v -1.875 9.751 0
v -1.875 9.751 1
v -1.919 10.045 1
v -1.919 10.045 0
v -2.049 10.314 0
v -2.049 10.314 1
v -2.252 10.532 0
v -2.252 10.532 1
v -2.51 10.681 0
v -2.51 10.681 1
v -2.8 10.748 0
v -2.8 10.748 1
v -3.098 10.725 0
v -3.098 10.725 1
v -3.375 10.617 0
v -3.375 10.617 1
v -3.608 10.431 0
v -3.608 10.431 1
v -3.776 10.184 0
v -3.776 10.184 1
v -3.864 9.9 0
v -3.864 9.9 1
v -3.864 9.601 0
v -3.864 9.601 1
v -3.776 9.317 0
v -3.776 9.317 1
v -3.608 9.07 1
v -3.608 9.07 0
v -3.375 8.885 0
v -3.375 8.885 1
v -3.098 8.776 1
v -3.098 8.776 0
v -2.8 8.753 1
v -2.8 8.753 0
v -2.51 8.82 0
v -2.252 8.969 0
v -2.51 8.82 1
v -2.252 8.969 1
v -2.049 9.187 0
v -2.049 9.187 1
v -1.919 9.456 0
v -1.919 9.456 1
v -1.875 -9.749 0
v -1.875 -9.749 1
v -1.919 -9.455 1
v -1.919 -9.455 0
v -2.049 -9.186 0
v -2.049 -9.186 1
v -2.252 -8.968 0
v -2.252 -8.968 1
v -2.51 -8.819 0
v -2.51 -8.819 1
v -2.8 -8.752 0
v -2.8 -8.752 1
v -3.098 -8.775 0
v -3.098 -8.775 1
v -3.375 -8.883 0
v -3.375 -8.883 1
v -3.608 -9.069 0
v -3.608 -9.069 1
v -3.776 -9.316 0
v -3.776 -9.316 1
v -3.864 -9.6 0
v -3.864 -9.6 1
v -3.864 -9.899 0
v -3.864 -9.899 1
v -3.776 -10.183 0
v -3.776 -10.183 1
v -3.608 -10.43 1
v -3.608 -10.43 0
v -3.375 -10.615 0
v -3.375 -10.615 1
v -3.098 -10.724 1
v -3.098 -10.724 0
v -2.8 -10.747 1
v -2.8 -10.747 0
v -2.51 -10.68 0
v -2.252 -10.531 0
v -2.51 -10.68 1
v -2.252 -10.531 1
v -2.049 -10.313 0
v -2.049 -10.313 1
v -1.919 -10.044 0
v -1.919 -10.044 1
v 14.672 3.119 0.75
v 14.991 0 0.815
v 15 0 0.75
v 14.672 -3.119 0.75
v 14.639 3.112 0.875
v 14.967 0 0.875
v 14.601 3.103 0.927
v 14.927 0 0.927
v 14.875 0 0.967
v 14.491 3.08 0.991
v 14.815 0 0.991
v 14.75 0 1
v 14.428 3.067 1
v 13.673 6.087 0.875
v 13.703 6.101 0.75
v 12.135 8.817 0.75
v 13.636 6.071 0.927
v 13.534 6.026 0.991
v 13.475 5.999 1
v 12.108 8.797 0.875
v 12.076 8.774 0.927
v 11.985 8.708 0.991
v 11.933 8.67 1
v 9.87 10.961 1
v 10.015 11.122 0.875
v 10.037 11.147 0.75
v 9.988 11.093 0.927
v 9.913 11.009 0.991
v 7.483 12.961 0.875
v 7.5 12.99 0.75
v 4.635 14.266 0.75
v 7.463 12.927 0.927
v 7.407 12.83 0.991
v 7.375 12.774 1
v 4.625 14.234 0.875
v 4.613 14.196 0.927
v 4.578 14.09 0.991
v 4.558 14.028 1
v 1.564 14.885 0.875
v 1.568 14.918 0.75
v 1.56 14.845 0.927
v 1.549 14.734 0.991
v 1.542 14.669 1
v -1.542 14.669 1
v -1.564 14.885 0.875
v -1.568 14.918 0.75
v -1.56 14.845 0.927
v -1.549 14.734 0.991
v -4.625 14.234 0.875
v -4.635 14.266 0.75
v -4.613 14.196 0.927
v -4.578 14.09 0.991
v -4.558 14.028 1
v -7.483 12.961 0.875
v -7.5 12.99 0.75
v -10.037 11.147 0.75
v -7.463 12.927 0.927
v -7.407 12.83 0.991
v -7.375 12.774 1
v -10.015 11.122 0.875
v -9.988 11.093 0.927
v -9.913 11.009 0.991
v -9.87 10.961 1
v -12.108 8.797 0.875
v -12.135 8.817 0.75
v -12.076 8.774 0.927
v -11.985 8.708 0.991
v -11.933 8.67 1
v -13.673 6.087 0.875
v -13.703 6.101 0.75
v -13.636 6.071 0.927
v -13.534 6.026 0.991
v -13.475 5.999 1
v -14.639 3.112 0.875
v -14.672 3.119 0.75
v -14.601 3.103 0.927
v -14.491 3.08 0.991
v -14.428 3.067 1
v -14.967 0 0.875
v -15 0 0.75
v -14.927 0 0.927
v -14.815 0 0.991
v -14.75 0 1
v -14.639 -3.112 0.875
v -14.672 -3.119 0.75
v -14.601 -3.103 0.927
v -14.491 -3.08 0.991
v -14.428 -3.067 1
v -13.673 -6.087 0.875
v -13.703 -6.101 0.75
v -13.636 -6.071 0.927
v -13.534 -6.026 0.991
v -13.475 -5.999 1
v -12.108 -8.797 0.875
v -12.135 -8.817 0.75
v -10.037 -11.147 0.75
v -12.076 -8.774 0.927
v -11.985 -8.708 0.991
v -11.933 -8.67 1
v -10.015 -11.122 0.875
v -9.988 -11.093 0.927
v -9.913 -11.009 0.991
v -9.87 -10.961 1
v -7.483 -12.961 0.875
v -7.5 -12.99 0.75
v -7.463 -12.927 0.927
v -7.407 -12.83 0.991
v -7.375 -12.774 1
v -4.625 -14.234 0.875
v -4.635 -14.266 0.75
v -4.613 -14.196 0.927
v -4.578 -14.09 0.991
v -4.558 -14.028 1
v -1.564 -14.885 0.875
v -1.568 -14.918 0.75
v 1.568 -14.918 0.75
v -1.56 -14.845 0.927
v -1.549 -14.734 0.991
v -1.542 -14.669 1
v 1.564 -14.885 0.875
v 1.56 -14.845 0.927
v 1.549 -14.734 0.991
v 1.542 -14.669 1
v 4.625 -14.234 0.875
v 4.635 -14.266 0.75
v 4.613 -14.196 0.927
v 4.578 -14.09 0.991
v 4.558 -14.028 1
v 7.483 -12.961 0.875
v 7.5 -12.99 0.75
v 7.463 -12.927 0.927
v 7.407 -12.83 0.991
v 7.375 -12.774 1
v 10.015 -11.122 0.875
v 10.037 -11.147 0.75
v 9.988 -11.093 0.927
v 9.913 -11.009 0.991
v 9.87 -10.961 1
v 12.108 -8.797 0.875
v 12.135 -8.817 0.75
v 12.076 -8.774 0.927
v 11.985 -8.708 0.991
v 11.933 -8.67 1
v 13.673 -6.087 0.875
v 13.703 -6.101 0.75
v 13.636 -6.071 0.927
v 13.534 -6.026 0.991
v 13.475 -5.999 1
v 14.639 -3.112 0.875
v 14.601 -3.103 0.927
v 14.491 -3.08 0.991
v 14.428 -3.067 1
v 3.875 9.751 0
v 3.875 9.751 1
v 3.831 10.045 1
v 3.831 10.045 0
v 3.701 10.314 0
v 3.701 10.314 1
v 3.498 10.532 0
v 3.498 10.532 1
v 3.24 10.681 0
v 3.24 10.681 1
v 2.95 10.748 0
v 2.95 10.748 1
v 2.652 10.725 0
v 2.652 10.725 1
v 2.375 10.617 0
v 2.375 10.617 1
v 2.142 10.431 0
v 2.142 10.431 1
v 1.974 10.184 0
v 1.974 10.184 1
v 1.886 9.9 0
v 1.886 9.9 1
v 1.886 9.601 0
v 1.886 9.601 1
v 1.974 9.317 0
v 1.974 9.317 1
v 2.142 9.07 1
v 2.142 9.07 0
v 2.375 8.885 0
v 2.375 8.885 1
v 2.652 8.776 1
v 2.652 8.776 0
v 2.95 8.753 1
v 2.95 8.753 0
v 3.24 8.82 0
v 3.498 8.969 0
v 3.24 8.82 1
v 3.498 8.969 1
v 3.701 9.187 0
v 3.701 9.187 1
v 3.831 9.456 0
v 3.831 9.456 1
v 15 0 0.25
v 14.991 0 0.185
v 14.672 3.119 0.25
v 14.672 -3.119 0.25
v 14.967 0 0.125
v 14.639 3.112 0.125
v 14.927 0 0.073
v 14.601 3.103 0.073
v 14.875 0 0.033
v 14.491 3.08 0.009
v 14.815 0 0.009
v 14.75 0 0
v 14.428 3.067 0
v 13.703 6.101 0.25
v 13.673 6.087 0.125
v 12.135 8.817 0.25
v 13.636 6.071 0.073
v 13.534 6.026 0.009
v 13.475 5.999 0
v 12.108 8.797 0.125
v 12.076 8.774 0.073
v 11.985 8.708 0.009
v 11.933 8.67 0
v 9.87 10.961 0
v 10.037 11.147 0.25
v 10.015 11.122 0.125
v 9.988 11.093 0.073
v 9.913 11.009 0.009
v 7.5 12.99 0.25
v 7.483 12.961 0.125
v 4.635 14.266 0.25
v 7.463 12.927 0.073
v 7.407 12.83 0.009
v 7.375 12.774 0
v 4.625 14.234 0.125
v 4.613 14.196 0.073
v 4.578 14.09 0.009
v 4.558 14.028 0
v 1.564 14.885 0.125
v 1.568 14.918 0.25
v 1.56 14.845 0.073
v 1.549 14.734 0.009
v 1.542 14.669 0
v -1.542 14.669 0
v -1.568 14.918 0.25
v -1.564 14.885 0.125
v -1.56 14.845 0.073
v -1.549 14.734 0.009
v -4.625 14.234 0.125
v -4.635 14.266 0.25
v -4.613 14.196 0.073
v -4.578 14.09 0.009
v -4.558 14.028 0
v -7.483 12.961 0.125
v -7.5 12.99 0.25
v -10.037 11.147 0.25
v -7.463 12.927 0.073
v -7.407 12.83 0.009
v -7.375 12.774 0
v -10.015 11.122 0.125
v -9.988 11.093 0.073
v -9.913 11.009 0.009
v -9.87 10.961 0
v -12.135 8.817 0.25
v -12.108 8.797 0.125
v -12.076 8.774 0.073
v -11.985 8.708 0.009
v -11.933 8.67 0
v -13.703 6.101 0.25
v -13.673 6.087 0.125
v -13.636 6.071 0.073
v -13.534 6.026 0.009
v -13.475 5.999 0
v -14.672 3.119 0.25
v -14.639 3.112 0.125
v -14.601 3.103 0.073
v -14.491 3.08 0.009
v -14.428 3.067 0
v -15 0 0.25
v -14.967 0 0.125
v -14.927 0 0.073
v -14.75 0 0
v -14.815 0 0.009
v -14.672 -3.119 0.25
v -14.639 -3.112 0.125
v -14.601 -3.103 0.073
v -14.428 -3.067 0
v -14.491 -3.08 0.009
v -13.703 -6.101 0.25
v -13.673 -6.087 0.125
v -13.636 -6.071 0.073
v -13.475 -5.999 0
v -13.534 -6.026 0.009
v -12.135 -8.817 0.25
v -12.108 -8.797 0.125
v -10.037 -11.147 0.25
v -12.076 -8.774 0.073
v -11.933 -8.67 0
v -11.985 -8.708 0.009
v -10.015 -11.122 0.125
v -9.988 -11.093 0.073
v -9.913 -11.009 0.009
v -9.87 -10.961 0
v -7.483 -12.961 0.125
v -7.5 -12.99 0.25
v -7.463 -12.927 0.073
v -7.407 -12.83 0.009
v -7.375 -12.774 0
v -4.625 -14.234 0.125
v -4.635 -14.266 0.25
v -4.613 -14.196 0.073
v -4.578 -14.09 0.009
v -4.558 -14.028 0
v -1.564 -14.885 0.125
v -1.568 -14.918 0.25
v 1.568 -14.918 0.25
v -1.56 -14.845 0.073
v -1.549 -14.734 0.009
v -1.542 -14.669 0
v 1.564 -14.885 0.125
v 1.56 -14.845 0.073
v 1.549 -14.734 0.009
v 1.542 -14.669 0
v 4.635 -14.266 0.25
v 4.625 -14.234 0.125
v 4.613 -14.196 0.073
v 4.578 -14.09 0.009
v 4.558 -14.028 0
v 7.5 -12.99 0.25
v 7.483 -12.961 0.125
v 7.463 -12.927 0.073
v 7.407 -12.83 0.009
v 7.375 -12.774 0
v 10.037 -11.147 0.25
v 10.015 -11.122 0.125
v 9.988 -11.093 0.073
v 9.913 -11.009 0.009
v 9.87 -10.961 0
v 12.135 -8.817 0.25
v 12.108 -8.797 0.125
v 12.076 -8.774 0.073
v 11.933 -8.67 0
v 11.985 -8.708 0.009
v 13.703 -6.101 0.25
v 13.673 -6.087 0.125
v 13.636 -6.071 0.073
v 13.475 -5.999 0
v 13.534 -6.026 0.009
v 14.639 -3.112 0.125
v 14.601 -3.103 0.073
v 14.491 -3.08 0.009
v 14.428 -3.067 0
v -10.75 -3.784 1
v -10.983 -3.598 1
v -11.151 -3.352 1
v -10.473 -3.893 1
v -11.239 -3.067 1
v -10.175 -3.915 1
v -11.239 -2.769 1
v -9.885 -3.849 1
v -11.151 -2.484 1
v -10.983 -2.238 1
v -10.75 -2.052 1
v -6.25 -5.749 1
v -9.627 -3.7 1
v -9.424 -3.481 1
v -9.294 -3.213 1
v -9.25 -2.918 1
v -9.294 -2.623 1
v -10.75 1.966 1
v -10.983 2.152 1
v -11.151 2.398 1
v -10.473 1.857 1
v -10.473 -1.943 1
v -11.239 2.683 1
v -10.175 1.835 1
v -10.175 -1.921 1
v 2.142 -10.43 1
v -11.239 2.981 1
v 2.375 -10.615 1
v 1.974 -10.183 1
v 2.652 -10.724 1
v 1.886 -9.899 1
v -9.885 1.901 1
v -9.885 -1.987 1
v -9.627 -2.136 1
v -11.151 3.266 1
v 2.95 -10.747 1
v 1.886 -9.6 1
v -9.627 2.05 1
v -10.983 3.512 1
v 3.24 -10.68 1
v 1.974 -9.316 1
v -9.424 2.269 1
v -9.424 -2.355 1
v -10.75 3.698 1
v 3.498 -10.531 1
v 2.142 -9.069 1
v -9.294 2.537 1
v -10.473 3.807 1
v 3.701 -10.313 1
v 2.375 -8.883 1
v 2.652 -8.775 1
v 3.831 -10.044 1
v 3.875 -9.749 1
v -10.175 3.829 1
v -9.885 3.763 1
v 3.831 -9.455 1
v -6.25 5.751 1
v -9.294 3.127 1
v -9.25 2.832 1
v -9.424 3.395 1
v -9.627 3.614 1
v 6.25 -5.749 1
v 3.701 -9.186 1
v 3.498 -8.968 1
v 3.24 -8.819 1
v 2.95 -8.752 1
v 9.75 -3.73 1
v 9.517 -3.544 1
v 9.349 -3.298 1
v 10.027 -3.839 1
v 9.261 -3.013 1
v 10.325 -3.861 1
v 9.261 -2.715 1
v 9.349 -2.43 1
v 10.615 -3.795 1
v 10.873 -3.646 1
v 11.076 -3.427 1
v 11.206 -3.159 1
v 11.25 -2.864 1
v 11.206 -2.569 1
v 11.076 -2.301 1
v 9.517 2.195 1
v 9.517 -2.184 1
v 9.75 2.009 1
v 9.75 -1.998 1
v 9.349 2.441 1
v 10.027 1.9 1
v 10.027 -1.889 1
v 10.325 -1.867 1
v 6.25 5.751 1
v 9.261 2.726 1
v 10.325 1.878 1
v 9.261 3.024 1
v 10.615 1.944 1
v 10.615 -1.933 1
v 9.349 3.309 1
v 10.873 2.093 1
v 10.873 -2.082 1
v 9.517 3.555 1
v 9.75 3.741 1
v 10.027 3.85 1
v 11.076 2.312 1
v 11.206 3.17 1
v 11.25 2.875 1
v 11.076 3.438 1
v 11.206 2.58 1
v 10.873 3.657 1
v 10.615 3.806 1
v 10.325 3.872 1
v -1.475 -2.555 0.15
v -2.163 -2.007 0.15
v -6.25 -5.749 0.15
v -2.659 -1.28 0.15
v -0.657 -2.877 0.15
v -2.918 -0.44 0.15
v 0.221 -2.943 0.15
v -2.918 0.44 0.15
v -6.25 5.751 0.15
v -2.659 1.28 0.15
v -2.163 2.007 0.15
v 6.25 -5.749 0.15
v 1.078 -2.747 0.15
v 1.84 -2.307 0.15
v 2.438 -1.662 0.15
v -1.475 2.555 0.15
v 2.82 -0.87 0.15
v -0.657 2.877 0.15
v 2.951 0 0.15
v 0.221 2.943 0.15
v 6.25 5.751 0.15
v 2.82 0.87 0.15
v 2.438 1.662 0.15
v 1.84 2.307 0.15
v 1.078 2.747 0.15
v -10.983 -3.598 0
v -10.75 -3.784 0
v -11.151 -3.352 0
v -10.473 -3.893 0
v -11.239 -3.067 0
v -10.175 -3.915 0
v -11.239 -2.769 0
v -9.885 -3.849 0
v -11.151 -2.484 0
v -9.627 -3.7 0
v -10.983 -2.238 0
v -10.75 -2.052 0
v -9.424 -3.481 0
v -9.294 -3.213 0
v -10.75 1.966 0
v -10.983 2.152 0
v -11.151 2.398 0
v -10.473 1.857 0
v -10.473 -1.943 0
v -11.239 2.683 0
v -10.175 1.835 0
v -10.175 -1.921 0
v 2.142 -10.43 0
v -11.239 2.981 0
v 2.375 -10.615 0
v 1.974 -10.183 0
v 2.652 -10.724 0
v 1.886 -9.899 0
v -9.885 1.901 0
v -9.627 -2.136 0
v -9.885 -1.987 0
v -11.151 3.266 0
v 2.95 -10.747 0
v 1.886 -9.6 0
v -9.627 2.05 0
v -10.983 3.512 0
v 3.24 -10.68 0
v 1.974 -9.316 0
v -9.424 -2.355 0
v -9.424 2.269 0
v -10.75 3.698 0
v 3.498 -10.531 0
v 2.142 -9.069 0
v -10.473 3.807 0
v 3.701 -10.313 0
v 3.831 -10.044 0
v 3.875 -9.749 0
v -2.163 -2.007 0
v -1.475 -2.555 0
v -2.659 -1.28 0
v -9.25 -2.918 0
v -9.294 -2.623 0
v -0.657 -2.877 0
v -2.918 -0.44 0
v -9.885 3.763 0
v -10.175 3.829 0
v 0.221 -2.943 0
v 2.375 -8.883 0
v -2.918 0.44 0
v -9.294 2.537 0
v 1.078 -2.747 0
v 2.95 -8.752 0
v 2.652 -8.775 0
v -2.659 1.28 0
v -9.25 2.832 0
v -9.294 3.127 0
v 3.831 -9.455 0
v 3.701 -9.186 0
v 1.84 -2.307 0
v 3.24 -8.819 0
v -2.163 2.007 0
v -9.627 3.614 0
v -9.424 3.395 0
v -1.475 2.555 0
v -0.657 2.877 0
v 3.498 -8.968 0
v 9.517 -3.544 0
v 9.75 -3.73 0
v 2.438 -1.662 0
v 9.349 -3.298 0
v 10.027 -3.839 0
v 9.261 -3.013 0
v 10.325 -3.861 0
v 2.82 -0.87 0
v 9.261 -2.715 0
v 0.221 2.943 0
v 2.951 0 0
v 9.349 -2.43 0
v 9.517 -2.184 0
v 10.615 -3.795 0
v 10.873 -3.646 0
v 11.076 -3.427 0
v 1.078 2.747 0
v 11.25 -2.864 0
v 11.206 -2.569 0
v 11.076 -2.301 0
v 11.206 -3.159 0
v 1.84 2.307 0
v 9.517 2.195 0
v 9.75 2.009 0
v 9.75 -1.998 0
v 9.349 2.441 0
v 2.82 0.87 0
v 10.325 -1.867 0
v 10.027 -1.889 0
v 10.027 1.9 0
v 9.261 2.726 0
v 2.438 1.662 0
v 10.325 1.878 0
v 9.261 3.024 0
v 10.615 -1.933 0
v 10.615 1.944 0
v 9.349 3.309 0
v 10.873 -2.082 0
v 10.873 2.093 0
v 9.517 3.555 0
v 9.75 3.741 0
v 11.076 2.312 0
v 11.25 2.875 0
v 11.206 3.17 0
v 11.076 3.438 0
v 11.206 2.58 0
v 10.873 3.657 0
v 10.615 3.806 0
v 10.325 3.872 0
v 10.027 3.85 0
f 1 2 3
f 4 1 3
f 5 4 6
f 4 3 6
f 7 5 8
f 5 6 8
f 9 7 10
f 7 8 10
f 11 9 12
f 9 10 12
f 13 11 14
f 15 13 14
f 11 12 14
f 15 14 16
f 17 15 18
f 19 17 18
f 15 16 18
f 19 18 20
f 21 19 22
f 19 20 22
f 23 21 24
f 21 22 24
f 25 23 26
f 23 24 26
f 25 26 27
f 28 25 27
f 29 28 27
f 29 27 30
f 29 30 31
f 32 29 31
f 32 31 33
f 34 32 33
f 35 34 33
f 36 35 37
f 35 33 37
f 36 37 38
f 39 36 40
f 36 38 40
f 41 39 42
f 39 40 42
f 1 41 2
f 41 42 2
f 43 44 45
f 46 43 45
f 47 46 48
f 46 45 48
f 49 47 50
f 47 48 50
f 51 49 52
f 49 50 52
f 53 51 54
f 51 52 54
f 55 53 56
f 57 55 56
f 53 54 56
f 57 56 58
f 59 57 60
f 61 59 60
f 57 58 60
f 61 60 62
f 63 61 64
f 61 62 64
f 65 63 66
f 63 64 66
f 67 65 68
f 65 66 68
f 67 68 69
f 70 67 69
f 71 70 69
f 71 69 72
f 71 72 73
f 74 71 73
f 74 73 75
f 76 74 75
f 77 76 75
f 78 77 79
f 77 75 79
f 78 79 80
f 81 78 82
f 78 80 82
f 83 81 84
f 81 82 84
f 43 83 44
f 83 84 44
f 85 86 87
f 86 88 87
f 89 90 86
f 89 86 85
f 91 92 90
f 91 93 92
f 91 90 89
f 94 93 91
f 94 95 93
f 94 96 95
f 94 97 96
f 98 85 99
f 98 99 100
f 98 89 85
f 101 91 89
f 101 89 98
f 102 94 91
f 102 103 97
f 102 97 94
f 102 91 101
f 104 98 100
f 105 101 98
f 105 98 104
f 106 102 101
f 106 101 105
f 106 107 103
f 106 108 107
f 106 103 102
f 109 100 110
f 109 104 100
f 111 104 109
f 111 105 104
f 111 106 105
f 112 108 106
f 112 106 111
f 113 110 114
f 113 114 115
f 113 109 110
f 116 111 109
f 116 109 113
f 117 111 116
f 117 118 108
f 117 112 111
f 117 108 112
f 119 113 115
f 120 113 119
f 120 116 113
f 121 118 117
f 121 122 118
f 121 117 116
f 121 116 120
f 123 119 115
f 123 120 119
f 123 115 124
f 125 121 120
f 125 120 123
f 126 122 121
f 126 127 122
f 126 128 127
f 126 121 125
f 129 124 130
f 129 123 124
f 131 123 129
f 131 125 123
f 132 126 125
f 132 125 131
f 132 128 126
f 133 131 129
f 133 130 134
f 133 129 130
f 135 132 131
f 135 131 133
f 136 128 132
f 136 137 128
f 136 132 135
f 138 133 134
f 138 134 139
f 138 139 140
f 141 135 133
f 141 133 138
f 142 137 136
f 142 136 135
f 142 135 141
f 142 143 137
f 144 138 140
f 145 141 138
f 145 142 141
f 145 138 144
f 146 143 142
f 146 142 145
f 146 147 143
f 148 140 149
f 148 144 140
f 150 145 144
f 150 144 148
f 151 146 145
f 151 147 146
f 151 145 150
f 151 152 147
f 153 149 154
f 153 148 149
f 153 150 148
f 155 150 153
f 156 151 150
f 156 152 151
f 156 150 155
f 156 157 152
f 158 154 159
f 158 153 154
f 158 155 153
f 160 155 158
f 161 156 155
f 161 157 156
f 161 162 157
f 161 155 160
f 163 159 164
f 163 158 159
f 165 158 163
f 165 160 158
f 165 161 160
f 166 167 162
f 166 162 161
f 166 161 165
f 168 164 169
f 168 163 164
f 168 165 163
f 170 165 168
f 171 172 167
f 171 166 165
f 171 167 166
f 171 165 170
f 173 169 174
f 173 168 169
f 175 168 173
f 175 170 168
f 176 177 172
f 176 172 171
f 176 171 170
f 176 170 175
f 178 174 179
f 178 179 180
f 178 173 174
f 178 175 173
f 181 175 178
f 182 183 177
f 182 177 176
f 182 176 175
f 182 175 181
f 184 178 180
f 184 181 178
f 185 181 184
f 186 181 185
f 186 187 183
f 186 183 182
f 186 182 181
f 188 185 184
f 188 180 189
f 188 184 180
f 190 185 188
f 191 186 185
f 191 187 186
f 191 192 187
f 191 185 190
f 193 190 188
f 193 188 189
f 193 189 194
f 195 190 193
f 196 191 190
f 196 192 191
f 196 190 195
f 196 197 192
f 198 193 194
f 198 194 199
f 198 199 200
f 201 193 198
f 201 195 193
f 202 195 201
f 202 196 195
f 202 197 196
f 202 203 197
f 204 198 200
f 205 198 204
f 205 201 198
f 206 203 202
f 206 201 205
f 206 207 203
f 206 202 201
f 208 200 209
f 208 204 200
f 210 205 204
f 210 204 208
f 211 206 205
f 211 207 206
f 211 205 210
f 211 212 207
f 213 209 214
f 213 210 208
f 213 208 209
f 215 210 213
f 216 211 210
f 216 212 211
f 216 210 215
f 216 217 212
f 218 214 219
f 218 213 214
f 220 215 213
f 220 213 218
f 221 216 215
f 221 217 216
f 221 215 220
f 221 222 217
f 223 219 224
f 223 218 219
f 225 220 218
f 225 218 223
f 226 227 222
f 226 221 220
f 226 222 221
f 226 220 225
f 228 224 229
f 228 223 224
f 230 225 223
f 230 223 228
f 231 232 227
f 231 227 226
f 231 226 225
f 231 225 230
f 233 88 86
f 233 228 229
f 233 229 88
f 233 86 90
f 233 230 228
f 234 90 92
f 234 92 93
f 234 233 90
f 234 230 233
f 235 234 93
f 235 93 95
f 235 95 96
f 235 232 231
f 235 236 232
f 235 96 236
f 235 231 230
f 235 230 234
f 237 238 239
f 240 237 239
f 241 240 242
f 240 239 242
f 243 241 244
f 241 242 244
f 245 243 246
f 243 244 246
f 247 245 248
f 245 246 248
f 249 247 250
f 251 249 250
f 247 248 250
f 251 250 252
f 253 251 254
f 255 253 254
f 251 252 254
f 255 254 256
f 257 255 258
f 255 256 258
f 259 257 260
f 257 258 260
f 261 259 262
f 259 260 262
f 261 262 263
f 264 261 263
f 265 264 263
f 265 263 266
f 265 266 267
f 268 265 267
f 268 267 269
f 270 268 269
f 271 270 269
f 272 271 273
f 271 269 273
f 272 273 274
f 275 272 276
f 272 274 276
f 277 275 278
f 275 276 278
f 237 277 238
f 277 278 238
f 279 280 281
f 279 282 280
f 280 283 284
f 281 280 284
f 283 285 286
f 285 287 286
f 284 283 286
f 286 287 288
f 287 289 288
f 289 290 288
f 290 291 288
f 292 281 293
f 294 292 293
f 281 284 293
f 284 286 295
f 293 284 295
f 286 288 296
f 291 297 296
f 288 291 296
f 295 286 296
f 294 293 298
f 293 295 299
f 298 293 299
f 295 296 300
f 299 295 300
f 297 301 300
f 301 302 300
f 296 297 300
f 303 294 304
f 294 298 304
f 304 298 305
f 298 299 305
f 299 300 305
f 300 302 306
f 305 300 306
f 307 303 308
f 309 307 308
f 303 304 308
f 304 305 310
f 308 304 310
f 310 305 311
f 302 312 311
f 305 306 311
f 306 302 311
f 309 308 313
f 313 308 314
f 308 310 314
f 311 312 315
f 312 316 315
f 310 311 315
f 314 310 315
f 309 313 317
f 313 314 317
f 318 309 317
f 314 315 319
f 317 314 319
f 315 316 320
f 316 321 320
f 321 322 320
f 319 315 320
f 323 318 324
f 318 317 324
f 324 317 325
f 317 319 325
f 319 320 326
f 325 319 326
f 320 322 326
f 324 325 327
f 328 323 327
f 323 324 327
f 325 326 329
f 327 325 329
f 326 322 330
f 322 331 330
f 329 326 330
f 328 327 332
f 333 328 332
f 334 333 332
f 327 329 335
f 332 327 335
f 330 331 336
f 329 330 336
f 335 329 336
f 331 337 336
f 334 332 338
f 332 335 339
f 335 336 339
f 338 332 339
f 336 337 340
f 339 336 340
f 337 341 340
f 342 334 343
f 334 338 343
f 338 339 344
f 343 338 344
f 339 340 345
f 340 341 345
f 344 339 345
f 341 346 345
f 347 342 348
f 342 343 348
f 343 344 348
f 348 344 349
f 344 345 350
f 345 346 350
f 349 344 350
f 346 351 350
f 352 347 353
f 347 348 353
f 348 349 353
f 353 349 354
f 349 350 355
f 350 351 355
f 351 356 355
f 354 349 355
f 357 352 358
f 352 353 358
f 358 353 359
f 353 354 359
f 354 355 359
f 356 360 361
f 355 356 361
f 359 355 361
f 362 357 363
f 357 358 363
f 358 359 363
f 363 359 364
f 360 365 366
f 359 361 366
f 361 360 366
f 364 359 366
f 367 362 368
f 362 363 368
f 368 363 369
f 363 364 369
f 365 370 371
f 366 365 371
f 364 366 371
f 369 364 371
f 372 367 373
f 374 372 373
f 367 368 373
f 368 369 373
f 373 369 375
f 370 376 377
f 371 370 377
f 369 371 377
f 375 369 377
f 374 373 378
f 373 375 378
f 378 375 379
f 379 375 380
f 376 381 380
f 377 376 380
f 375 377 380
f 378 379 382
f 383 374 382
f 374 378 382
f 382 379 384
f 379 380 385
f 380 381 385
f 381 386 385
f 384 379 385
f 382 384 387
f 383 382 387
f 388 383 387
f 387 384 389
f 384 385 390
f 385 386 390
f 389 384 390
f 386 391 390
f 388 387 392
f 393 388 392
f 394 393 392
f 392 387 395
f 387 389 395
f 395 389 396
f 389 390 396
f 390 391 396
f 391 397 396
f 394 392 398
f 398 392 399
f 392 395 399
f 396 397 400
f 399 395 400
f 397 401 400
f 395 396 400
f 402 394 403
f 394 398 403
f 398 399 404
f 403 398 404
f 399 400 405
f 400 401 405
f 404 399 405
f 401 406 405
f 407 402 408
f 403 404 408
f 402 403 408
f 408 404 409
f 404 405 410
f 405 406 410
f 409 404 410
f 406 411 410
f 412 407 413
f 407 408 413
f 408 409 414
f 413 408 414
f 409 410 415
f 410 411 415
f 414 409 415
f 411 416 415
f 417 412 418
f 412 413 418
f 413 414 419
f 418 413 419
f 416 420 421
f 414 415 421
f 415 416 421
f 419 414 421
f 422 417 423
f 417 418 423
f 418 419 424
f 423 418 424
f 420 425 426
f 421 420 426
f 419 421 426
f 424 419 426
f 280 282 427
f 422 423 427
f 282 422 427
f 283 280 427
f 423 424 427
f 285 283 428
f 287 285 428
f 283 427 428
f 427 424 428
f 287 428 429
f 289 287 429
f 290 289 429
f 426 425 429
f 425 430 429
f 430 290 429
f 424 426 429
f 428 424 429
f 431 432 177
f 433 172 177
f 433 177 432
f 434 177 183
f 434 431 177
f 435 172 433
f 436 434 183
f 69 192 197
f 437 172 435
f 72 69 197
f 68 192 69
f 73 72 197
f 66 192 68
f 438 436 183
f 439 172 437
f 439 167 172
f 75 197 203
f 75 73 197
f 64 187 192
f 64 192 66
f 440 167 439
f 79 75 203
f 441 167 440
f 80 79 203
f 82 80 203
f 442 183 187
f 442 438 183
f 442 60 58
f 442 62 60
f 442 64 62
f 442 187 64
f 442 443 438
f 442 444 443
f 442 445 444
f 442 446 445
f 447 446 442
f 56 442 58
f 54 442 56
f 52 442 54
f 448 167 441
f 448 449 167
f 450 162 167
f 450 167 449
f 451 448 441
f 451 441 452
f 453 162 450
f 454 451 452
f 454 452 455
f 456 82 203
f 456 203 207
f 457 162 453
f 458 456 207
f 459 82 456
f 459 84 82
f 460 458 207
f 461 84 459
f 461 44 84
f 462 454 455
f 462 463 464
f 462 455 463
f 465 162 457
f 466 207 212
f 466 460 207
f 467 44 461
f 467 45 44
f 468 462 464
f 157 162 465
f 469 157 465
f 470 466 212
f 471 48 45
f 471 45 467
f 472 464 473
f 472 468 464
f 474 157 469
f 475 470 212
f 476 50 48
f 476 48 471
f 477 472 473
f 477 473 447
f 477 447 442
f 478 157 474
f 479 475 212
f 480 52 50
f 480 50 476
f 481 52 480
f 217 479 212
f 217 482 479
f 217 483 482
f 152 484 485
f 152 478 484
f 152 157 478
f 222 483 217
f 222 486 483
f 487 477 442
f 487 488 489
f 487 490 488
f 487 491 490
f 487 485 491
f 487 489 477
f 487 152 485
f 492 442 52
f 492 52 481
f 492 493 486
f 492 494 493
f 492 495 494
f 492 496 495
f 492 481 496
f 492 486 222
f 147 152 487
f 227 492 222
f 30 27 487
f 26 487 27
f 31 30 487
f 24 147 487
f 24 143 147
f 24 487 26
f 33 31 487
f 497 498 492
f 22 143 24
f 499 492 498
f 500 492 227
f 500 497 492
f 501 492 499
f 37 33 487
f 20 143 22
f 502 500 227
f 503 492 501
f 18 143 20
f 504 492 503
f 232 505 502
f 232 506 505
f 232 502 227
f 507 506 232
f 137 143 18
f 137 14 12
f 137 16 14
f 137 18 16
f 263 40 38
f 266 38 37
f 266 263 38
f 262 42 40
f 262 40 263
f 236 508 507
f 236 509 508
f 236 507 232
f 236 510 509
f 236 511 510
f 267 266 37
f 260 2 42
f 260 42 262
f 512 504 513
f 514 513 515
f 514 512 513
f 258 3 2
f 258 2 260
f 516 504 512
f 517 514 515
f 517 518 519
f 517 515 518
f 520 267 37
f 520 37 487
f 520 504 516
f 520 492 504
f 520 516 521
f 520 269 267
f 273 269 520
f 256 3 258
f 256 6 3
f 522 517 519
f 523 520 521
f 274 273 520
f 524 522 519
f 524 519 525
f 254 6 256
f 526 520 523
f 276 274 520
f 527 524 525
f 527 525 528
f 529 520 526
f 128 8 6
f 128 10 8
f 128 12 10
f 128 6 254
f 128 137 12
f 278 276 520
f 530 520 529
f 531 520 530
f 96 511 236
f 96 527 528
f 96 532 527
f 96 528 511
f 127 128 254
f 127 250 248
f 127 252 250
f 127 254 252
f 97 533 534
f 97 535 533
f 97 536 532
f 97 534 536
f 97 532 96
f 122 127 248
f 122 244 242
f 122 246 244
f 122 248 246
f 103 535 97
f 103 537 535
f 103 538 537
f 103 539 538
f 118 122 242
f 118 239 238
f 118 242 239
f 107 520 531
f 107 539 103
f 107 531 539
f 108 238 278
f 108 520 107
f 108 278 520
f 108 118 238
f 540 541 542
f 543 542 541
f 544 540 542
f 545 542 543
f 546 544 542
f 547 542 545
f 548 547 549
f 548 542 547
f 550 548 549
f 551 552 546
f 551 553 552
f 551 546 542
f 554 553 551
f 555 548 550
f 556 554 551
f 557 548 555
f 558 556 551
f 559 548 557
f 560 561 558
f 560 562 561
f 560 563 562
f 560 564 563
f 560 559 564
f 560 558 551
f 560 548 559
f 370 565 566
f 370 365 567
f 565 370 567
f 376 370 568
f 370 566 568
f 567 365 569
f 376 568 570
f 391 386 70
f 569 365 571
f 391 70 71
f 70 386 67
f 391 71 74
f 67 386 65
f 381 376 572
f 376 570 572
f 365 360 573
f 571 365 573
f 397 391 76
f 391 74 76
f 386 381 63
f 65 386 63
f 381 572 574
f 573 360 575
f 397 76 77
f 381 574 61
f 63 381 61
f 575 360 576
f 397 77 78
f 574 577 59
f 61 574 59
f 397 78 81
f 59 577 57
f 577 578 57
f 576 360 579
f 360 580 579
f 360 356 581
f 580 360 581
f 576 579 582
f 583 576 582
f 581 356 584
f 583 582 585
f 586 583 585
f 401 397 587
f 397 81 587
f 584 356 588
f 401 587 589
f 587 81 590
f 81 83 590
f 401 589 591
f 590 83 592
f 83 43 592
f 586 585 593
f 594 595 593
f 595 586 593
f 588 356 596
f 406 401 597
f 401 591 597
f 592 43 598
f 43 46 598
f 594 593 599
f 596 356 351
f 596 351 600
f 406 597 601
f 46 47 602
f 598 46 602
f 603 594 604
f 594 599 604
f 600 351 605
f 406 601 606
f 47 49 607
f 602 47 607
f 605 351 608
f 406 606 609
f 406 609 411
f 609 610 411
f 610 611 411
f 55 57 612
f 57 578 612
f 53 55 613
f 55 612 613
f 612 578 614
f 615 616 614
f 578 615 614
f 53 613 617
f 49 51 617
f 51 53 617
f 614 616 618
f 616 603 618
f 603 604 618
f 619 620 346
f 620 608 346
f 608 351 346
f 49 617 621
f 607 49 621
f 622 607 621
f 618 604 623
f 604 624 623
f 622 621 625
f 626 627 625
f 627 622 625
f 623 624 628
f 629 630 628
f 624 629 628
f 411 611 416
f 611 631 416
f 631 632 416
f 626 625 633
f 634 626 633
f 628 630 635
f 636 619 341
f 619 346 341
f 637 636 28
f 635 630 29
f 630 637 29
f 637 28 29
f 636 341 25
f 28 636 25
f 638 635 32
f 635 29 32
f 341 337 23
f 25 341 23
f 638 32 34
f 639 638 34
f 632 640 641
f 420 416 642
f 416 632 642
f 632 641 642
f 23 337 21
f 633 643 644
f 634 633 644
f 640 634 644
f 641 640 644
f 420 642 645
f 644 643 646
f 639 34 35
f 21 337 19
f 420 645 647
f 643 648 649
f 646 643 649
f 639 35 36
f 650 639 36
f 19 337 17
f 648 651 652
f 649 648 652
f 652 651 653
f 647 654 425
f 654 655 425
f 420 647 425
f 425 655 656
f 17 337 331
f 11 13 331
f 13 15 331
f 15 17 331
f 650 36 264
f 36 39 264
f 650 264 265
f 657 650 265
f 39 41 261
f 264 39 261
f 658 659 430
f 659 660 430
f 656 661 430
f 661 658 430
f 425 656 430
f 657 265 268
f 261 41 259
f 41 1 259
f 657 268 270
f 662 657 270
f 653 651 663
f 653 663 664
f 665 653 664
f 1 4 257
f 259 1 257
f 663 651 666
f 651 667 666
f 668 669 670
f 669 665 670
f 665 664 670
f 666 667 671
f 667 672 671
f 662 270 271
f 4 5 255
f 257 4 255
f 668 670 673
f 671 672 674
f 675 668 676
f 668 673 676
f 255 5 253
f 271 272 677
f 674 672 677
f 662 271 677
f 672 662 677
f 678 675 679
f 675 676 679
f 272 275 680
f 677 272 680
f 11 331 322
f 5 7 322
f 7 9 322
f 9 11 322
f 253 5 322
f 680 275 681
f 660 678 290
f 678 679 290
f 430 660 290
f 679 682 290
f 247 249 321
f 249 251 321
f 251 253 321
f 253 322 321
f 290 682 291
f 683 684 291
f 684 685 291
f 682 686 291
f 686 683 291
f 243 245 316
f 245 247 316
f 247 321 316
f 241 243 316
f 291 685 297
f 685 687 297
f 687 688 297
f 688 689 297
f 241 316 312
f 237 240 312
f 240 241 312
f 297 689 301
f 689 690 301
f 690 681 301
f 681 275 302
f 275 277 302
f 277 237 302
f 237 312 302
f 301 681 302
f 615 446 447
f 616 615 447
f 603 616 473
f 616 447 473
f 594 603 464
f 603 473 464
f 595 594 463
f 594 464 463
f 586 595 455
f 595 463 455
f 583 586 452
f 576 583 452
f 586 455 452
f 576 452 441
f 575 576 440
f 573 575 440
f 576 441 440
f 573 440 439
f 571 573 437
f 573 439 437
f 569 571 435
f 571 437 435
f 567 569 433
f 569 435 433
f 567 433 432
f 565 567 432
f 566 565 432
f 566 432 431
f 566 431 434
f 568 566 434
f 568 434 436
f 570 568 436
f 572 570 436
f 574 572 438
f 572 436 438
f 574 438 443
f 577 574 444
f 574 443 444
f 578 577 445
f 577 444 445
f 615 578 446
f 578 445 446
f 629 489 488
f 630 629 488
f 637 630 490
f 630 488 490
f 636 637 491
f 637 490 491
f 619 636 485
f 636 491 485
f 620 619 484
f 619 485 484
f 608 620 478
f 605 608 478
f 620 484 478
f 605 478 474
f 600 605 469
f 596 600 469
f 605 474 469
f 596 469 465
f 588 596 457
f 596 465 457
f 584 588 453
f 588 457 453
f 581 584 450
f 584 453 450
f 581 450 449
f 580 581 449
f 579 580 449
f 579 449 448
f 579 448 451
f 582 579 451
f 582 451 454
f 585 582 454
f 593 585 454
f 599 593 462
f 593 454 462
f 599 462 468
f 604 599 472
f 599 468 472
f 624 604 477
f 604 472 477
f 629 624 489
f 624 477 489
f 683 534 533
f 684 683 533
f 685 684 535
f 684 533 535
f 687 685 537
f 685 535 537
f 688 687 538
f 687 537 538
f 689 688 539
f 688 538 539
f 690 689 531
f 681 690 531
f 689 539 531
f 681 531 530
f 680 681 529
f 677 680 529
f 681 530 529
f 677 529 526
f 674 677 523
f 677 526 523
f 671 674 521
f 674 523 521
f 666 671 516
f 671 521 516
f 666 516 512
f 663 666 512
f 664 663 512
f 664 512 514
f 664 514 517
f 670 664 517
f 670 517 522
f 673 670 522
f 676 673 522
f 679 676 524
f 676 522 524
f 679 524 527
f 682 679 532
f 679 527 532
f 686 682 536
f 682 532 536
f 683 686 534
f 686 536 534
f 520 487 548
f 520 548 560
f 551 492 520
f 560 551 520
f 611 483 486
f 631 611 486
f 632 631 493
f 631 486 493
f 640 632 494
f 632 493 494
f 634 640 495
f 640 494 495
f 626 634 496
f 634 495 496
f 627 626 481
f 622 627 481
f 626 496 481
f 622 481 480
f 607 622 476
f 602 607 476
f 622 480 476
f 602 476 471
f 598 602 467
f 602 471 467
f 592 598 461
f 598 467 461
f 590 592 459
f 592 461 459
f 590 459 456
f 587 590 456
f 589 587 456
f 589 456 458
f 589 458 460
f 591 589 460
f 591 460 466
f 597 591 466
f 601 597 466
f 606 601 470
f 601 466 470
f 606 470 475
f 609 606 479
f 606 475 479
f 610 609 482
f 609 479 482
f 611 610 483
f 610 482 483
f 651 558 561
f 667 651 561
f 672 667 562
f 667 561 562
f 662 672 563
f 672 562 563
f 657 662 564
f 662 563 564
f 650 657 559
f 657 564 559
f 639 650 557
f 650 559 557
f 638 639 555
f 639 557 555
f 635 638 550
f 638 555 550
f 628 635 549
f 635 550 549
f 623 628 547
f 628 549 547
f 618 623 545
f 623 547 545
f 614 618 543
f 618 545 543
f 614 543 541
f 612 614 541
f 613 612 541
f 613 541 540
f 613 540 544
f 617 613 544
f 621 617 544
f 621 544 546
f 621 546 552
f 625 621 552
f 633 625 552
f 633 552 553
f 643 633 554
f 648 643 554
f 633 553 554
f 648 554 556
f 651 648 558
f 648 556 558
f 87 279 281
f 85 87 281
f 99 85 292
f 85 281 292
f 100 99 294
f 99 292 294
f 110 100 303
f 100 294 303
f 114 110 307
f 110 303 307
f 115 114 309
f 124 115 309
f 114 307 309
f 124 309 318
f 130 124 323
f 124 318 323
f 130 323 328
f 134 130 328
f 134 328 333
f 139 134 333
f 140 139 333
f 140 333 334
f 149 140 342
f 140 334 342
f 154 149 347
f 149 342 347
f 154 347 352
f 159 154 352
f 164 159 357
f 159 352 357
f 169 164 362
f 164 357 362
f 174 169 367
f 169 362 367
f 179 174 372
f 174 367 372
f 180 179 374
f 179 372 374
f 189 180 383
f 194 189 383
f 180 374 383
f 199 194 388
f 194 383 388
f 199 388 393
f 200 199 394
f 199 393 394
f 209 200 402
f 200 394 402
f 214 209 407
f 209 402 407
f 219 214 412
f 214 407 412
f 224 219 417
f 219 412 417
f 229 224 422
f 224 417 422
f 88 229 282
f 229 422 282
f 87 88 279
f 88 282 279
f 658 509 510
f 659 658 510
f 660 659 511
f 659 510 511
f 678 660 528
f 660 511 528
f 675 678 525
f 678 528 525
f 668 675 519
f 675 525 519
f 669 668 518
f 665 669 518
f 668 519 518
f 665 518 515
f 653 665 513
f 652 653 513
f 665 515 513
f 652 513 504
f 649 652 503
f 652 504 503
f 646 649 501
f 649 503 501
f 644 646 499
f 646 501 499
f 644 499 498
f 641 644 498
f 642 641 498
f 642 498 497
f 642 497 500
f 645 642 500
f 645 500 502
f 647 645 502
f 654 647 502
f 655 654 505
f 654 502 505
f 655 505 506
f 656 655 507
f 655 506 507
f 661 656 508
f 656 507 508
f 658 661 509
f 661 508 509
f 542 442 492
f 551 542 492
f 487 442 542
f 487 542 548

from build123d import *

# Parameters (mm, degrees)
F0_R     = 15
F1_DEPTH = 1
F2_W     = 12.5
F2_H     = 11.5
F3_DEPTH = 0.85
F5_R     = 2.950818
F6_DEPTH = 0.15
F7_R     = 0.25
F8_R     = 1
F9_DEPTH = 1


with BuildPart() as f1:
    # F0 (on Top) → F1 (new body)
    with BuildSketch(Plane.XY):
        Circle(F0_R)
    extrude(amount=F1_DEPTH)

    # F2 (on face) → F3 (cut)
    with BuildSketch(Plane.XY.offset(1)):
        with Locations((0, 0.000526)):
            Rectangle(F2_W, F2_H)
    extrude(amount=-F3_DEPTH, mode=Mode.SUBTRACT)

    # F5 (on offset) → F6 (cut)
    with BuildSketch(Plane.XY.offset(0.15)):
        Circle(F5_R)
    extrude(amount=-F6_DEPTH, mode=Mode.SUBTRACT)

    # F7
    f7_edges = [f1.edges().sort_by_distance(p)[0] for p in [
        (-15, 0, 1),
        (-15, 0, 0),
    ]]
    fillet(f7_edges, radius=F7_R)

    # F8 (on face) → F9 (cut)
    with BuildSketch(Plane.XY.offset(1)):
        with Locations((-10.25, 2.832073)):
            Circle(F8_R)
        with Locations((-10.25, -2.917927)):
            Circle(F8_R)
        with Locations((-2.875, 9.750526)):
            Circle(F8_R)
        with Locations((2.875, 9.750526)):
            Circle(F8_R)
        with Locations((10.25, 2.875)):
            Circle(F8_R)
        with Locations((10.25, -2.863999)):
            Circle(F8_R)
        with Locations((2.875, -9.749474)):
            Circle(F8_R)
        with Locations((-2.875, -9.749474)):
            Circle(F8_R)
    extrude(amount=-F9_DEPTH, mode=Mode.SUBTRACT)


solid = f1.part
